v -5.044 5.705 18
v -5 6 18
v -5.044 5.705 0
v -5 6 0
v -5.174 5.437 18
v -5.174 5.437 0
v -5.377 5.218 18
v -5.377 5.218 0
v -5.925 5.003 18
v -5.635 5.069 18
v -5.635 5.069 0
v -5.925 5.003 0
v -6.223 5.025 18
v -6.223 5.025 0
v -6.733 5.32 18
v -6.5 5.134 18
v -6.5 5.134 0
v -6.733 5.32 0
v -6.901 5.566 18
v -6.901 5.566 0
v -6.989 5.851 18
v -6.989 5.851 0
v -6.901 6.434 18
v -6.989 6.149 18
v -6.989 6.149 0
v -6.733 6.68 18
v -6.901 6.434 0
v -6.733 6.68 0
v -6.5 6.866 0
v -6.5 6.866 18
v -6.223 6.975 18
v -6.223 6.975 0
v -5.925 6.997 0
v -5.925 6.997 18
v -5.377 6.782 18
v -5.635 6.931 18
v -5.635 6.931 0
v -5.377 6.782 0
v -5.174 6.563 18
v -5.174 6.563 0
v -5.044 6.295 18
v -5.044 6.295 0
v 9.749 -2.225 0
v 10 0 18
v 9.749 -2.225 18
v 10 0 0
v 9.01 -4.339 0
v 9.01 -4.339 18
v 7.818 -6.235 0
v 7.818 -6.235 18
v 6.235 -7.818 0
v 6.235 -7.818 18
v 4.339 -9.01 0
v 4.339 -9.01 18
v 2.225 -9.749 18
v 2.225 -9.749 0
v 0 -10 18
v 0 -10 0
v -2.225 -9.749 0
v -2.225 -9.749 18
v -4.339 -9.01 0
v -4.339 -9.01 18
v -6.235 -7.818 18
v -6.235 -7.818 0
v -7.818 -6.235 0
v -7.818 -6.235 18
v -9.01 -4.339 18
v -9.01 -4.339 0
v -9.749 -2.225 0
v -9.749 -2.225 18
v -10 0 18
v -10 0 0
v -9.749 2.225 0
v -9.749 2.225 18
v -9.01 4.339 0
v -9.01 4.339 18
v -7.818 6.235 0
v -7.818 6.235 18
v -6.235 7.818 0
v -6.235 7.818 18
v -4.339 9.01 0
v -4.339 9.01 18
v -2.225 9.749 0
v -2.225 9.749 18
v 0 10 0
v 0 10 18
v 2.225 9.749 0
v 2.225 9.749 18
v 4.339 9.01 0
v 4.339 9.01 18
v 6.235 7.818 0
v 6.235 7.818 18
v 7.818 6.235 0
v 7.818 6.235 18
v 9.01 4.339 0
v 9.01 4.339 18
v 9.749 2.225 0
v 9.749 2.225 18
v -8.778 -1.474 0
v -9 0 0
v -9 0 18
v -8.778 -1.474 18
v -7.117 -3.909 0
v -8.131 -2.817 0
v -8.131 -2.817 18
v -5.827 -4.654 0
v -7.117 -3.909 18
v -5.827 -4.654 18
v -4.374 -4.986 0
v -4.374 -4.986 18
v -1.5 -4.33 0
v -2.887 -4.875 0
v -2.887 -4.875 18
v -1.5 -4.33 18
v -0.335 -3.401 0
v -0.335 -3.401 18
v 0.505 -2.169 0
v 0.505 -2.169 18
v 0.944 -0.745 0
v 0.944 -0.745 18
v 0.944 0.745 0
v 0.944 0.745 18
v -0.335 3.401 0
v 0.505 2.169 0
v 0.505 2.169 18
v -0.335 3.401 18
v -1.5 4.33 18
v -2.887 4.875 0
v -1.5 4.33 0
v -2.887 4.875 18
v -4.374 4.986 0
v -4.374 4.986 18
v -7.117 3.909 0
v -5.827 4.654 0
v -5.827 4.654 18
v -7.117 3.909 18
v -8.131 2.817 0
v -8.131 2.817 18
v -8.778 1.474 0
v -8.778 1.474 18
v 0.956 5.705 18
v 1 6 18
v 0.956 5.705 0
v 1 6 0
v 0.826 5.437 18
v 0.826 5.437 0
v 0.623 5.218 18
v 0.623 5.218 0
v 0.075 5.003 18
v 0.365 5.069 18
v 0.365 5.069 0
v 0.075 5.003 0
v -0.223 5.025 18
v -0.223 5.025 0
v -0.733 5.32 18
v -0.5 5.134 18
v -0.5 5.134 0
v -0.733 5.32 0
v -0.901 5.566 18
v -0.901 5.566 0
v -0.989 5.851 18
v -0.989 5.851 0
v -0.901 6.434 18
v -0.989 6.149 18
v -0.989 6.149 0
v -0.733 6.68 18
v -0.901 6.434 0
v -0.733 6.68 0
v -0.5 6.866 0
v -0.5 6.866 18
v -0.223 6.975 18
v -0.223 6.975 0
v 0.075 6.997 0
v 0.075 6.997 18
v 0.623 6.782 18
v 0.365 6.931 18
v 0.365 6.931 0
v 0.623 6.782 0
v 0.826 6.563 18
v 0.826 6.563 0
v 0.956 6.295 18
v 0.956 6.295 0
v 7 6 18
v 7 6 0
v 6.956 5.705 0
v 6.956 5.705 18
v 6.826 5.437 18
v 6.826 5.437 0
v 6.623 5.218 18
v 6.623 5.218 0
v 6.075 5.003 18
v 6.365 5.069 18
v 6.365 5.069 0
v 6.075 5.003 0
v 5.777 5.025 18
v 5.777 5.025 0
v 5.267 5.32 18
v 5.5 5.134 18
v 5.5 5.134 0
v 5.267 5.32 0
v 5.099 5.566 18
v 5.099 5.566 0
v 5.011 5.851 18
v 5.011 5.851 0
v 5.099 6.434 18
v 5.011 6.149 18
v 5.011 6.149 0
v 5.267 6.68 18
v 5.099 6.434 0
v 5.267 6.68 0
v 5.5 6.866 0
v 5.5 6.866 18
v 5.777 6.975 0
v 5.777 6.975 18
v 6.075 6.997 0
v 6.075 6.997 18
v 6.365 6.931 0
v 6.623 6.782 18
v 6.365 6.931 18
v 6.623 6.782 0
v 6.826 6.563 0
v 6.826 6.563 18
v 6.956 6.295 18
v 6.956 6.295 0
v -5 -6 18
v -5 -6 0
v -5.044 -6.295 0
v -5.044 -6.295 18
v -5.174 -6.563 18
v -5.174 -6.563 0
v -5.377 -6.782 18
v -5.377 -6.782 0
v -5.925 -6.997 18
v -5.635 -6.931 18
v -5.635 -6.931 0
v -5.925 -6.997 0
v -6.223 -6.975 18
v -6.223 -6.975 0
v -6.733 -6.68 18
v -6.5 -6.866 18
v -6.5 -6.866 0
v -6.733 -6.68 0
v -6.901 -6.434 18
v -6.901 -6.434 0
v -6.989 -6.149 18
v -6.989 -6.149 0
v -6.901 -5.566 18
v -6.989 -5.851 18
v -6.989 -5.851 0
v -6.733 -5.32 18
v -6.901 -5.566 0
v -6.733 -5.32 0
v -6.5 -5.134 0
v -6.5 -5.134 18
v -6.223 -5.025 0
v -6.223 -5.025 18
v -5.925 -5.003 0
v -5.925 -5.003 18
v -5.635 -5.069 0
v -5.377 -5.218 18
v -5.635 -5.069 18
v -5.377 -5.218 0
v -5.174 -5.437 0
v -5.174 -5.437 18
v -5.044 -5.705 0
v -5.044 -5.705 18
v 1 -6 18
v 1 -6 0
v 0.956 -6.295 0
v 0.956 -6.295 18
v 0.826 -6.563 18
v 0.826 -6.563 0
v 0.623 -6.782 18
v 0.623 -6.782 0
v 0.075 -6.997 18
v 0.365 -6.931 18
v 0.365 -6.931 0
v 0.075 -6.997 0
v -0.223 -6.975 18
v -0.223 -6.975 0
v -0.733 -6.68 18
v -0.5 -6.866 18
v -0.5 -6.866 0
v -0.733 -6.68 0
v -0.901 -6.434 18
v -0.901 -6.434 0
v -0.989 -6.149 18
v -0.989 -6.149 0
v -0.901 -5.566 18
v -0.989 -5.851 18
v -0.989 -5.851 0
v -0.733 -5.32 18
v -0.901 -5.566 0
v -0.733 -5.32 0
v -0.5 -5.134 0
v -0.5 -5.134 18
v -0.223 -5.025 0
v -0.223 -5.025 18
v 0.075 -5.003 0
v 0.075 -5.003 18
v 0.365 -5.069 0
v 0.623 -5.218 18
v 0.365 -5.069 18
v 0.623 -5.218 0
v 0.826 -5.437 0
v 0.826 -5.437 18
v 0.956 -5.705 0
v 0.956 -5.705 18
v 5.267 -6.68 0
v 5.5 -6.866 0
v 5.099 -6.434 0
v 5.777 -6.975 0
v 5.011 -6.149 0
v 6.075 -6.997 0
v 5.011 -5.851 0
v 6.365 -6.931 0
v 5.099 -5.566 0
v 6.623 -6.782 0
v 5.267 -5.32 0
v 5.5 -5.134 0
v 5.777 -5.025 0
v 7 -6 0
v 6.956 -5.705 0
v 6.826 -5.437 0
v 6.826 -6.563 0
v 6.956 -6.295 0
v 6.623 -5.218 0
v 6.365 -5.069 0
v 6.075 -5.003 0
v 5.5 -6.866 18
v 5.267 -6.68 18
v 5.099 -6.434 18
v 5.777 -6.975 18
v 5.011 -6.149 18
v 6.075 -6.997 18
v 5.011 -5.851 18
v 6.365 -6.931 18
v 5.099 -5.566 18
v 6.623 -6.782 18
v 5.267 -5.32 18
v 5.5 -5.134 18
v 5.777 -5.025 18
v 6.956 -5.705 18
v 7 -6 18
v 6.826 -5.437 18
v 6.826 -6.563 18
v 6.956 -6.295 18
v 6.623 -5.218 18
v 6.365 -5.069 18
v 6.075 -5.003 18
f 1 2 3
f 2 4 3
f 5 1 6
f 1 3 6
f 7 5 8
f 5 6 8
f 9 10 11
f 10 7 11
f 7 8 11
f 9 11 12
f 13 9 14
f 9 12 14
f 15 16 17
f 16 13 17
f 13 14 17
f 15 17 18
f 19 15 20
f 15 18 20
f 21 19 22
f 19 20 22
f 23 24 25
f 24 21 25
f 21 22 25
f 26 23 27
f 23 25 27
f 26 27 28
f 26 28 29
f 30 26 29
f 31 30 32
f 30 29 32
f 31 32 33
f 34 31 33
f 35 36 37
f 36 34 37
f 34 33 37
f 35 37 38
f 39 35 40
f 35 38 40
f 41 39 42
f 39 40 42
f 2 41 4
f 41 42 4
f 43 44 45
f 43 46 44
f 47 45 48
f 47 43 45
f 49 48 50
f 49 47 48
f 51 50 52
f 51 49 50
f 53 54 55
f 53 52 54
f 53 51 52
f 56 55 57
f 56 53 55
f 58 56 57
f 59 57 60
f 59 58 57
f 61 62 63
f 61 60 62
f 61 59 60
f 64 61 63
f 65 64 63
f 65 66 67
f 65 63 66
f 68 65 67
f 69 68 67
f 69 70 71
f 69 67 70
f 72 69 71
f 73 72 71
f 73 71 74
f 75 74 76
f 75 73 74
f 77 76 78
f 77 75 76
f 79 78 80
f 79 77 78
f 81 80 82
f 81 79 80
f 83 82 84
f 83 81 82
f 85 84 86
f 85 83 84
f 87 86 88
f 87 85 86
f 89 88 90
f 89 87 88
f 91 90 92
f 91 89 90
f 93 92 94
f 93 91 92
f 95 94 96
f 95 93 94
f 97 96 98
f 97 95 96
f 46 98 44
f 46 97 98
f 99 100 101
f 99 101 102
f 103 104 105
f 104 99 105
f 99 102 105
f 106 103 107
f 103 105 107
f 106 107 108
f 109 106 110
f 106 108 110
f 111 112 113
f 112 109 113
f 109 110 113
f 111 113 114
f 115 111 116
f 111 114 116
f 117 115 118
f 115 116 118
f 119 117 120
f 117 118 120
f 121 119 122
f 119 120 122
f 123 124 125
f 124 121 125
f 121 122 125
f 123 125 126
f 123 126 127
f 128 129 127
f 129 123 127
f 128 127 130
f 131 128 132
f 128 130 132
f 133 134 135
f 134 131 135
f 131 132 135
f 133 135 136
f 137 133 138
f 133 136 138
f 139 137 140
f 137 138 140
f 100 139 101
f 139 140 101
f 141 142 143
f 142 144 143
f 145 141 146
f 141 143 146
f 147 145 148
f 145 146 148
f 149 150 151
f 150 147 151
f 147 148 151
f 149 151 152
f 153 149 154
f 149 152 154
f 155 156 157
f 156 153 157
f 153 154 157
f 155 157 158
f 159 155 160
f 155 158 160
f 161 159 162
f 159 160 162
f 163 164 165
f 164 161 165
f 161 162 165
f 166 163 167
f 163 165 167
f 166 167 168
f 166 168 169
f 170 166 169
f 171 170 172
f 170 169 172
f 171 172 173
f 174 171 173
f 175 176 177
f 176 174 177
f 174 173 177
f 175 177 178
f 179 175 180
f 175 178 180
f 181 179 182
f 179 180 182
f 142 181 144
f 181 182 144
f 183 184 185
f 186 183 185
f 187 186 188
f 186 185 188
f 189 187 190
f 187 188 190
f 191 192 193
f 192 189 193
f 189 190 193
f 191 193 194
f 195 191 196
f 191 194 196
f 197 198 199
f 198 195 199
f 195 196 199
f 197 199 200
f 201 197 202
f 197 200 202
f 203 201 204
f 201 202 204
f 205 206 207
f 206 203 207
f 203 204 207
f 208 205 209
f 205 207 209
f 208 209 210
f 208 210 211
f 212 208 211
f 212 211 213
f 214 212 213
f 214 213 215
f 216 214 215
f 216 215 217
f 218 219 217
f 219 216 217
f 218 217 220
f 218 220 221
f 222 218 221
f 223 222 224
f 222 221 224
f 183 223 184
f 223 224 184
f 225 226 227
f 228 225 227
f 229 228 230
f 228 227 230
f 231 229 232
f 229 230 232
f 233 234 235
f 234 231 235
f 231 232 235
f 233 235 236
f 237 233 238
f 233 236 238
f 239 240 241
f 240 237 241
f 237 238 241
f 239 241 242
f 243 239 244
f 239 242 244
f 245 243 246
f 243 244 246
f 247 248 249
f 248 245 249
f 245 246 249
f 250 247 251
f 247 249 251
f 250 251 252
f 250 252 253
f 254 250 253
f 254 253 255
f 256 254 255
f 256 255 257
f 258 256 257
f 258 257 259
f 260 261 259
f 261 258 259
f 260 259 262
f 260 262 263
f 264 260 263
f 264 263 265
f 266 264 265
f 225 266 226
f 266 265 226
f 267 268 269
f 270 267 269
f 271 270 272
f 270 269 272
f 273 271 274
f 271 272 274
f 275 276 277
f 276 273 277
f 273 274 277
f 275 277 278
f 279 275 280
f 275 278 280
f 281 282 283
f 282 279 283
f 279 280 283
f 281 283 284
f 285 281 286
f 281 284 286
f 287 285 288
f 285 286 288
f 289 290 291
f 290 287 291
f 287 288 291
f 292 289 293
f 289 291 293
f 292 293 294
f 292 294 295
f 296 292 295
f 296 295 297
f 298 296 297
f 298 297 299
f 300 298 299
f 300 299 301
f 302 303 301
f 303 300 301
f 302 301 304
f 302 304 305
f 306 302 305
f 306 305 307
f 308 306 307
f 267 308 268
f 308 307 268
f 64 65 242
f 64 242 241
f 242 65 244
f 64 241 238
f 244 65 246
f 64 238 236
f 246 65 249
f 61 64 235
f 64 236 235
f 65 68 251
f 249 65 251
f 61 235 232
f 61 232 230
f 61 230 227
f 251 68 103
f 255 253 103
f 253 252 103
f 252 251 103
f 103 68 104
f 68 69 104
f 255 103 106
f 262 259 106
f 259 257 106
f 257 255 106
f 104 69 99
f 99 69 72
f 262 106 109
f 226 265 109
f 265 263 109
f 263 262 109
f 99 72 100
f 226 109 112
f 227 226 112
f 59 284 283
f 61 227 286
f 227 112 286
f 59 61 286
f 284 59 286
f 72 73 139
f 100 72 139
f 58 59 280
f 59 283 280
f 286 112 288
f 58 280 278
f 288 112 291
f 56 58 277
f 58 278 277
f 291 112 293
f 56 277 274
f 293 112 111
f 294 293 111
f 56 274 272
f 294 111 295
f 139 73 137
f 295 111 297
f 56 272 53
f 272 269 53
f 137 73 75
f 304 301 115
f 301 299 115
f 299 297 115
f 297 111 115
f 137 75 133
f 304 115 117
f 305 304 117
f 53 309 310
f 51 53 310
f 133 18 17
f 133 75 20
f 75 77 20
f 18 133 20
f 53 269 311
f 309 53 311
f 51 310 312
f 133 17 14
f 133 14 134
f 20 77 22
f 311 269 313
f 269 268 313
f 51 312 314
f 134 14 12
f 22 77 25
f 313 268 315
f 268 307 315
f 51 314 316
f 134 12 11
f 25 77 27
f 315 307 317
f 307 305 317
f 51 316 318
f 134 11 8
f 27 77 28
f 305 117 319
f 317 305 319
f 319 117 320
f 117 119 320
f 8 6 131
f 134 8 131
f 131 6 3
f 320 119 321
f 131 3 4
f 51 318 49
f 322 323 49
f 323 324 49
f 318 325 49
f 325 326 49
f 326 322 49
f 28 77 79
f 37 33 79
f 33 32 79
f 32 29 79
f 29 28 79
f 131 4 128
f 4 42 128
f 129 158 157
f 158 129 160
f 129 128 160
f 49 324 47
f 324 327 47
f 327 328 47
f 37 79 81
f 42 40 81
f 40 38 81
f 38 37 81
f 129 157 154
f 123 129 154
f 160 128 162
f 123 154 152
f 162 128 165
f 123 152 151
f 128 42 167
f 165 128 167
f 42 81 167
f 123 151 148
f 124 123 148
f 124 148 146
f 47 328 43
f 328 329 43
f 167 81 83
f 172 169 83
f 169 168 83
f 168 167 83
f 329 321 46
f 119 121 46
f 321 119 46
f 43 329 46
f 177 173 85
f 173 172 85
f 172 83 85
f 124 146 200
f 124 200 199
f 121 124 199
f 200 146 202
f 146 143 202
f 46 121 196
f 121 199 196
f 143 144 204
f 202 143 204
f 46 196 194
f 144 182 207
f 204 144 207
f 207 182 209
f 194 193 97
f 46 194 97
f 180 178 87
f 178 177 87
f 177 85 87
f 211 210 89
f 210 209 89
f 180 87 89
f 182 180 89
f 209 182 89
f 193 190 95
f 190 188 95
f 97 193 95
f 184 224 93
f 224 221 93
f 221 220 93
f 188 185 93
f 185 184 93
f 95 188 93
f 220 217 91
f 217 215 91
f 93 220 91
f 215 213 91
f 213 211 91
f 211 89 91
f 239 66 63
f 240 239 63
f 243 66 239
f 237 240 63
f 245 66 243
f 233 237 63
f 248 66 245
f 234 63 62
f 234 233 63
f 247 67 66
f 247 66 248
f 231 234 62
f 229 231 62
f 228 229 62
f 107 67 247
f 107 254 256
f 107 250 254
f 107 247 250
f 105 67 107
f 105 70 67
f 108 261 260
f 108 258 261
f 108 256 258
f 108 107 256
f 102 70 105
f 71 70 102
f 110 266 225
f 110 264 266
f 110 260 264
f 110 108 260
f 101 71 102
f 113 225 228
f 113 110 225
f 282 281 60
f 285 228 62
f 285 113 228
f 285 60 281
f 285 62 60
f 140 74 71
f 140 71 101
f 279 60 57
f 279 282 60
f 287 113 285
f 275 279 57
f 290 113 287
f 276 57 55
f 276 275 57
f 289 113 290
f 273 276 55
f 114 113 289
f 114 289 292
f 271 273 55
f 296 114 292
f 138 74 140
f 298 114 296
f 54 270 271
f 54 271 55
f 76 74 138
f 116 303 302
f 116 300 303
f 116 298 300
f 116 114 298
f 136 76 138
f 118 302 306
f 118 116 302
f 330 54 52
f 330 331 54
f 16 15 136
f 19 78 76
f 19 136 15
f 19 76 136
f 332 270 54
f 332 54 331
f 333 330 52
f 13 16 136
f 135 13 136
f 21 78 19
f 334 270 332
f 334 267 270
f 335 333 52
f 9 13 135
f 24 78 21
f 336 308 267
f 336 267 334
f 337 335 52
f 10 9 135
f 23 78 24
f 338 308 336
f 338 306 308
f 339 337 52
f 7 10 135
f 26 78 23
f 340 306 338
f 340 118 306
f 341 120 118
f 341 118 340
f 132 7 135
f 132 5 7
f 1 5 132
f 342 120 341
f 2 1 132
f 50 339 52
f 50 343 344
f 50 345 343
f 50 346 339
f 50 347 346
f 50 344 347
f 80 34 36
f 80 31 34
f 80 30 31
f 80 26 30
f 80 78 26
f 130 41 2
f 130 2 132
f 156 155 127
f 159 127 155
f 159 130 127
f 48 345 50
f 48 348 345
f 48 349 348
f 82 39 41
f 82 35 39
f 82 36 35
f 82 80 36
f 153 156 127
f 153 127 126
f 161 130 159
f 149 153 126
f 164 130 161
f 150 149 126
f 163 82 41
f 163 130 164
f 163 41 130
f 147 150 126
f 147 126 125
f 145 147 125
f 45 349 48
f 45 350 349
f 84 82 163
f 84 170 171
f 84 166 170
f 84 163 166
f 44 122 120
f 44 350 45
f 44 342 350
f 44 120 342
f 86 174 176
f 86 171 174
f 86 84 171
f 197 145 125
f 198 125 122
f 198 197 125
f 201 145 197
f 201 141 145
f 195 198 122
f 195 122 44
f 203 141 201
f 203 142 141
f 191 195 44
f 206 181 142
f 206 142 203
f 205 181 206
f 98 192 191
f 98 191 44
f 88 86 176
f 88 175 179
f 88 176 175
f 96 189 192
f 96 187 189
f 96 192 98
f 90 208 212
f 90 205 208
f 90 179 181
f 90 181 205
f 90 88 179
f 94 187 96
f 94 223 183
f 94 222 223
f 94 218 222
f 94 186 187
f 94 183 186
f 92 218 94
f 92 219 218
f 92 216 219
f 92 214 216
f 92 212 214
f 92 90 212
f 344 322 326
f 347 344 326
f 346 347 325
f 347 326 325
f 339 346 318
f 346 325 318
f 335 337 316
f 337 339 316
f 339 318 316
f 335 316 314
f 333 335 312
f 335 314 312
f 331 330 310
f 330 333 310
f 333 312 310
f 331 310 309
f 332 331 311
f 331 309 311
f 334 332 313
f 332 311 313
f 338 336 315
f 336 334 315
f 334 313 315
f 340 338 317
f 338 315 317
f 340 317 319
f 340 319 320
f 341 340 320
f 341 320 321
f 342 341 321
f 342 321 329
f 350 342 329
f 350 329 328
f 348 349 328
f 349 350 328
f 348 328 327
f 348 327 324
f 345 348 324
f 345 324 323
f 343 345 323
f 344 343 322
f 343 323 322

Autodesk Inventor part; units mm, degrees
ref_plane "YZ Plane" through (0, 0, 0) normal (1, 0, 0) x (0, 1, 0)
ref_plane "XZ Plane" through (0, 0, 0) normal (0, 1, 0) x (-1, 0, 0)
ref_plane "XY Plane" through (0, 0, 0) normal (0, 0, 1) x (1, 0, 0)
sketch "Sketch1" plane through (0, 0, 0) normal (0, 0, 1) x (1, 0, 0)
  circle A0 centre (0, 0) radius 10
  circle A1 centre (-6, 6) radius 1
  circle A2 centre (0, 6) radius 1
  circle A3 centre (6, 6) radius 1
  circle A4 centre (6, -6) radius 1
  circle A5 centre (0, -6) radius 1
  circle A6 centre (-6, -6) radius 1
  dimension "d0" = 20
  dimension "d2" = 2
  dimension "d3" = 12
  dimension "d4" = 6
  dimension "d5" = 12
  dimension "d6" = 6
  dimension "d7" = 6
  dimension "d8" = 2
extrude "Extrusion1" add sketch "Sketch1" along normal blind 18
sketch "Sketch2" plane through (0, 0, 18) normal (0, 0, -1) x (-1, 0, 0)
  circle A0 centre (4, 0) radius 5
  circle A1 centre (0, 6) radius 1 projected
  point P0 (0, 0)
  dimension "d11" = 10
  dimension "d12" = 4
extrude "Extrusion2" cut sketch "Sketch2" along normal blind 18 contours A0
equation "\"d4\" = 0.5 * d3"
equation "\"d6\" = 0.5 * d5"
properties part number "11"
